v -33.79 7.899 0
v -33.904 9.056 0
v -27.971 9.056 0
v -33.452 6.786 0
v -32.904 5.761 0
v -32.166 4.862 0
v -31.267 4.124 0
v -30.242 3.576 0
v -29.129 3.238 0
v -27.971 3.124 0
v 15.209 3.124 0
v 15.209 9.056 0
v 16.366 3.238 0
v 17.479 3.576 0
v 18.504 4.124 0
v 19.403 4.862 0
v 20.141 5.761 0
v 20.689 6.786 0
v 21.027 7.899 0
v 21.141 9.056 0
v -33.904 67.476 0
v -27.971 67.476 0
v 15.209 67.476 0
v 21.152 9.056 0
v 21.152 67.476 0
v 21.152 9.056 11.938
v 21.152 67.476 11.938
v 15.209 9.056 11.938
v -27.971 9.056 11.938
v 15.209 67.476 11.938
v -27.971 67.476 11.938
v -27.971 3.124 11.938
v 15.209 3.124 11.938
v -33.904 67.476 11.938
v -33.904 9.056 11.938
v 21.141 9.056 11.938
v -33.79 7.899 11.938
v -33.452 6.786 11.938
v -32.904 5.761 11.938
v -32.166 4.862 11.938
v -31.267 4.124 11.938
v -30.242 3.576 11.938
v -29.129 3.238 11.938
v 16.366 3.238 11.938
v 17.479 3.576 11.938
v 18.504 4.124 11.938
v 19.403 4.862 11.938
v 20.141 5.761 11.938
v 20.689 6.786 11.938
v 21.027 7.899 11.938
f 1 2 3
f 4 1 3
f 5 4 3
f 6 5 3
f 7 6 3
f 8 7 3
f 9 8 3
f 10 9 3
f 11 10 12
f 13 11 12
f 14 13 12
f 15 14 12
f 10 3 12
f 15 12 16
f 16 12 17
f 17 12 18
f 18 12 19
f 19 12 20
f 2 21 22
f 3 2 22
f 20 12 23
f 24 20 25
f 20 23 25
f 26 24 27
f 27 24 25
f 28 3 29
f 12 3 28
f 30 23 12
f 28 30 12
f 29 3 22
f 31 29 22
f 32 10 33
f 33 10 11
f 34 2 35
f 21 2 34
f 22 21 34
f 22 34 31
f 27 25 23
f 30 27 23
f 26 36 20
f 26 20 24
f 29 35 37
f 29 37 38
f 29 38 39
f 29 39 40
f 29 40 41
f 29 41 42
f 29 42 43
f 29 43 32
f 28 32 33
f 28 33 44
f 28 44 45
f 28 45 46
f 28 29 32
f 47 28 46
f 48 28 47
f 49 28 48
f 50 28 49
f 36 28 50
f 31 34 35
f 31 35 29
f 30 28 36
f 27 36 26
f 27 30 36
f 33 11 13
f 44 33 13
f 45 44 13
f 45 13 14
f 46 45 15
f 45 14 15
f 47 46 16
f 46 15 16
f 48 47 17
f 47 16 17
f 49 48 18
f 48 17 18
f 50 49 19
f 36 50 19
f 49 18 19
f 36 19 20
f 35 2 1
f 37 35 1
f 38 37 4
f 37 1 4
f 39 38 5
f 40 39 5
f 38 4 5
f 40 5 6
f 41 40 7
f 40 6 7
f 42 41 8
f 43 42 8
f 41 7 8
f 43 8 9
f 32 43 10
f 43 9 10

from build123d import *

# Parameters (mm, degrees)
F0_W     = 43.18
F0_H     = 5.932273
F0_W_2   = 5.932274
F0_H_2   = 58.42
F1_DEPTH = 11.938


with BuildPart() as f1:
    # F0 (on Top) → F1 (new body)
    with BuildSketch(Plane.XY):
        with Locations((-6.381456, 6.09027)):
            Rectangle(F0_W, F0_H)
        with BuildLine():
            Line((-27.971456, 3.124134), (-27.971456, 9.056407))
            Line((-27.971456, 9.056407), (-33.90373, 9.056407))
            ThreePointArc((-33.90373, 9.056407), (-32.166207, 4.861656), (-27.971456, 3.124134))
        make_face()
        with Locations((-30.937593, 38.266407)):
            Rectangle(F0_W_2, F0_H_2)
        with BuildLine():
            Line((21.140817, 9.056407), (15.208544, 9.056407))
            Line((15.208544, 9.056407), (15.208544, 3.124134))
            ThreePointArc((15.208544, 3.124134), (19.403295, 4.861656), (21.140817, 9.056407))
        make_face()
        Polygon((15.208544, 67.476407), (15.208544, 9.056407), (21.140817, 9.056407), (21.152144, 9.056407), (21.152144, 67.476407), align=None)
    extrude(amount=F1_DEPTH)


solid = f1.part
